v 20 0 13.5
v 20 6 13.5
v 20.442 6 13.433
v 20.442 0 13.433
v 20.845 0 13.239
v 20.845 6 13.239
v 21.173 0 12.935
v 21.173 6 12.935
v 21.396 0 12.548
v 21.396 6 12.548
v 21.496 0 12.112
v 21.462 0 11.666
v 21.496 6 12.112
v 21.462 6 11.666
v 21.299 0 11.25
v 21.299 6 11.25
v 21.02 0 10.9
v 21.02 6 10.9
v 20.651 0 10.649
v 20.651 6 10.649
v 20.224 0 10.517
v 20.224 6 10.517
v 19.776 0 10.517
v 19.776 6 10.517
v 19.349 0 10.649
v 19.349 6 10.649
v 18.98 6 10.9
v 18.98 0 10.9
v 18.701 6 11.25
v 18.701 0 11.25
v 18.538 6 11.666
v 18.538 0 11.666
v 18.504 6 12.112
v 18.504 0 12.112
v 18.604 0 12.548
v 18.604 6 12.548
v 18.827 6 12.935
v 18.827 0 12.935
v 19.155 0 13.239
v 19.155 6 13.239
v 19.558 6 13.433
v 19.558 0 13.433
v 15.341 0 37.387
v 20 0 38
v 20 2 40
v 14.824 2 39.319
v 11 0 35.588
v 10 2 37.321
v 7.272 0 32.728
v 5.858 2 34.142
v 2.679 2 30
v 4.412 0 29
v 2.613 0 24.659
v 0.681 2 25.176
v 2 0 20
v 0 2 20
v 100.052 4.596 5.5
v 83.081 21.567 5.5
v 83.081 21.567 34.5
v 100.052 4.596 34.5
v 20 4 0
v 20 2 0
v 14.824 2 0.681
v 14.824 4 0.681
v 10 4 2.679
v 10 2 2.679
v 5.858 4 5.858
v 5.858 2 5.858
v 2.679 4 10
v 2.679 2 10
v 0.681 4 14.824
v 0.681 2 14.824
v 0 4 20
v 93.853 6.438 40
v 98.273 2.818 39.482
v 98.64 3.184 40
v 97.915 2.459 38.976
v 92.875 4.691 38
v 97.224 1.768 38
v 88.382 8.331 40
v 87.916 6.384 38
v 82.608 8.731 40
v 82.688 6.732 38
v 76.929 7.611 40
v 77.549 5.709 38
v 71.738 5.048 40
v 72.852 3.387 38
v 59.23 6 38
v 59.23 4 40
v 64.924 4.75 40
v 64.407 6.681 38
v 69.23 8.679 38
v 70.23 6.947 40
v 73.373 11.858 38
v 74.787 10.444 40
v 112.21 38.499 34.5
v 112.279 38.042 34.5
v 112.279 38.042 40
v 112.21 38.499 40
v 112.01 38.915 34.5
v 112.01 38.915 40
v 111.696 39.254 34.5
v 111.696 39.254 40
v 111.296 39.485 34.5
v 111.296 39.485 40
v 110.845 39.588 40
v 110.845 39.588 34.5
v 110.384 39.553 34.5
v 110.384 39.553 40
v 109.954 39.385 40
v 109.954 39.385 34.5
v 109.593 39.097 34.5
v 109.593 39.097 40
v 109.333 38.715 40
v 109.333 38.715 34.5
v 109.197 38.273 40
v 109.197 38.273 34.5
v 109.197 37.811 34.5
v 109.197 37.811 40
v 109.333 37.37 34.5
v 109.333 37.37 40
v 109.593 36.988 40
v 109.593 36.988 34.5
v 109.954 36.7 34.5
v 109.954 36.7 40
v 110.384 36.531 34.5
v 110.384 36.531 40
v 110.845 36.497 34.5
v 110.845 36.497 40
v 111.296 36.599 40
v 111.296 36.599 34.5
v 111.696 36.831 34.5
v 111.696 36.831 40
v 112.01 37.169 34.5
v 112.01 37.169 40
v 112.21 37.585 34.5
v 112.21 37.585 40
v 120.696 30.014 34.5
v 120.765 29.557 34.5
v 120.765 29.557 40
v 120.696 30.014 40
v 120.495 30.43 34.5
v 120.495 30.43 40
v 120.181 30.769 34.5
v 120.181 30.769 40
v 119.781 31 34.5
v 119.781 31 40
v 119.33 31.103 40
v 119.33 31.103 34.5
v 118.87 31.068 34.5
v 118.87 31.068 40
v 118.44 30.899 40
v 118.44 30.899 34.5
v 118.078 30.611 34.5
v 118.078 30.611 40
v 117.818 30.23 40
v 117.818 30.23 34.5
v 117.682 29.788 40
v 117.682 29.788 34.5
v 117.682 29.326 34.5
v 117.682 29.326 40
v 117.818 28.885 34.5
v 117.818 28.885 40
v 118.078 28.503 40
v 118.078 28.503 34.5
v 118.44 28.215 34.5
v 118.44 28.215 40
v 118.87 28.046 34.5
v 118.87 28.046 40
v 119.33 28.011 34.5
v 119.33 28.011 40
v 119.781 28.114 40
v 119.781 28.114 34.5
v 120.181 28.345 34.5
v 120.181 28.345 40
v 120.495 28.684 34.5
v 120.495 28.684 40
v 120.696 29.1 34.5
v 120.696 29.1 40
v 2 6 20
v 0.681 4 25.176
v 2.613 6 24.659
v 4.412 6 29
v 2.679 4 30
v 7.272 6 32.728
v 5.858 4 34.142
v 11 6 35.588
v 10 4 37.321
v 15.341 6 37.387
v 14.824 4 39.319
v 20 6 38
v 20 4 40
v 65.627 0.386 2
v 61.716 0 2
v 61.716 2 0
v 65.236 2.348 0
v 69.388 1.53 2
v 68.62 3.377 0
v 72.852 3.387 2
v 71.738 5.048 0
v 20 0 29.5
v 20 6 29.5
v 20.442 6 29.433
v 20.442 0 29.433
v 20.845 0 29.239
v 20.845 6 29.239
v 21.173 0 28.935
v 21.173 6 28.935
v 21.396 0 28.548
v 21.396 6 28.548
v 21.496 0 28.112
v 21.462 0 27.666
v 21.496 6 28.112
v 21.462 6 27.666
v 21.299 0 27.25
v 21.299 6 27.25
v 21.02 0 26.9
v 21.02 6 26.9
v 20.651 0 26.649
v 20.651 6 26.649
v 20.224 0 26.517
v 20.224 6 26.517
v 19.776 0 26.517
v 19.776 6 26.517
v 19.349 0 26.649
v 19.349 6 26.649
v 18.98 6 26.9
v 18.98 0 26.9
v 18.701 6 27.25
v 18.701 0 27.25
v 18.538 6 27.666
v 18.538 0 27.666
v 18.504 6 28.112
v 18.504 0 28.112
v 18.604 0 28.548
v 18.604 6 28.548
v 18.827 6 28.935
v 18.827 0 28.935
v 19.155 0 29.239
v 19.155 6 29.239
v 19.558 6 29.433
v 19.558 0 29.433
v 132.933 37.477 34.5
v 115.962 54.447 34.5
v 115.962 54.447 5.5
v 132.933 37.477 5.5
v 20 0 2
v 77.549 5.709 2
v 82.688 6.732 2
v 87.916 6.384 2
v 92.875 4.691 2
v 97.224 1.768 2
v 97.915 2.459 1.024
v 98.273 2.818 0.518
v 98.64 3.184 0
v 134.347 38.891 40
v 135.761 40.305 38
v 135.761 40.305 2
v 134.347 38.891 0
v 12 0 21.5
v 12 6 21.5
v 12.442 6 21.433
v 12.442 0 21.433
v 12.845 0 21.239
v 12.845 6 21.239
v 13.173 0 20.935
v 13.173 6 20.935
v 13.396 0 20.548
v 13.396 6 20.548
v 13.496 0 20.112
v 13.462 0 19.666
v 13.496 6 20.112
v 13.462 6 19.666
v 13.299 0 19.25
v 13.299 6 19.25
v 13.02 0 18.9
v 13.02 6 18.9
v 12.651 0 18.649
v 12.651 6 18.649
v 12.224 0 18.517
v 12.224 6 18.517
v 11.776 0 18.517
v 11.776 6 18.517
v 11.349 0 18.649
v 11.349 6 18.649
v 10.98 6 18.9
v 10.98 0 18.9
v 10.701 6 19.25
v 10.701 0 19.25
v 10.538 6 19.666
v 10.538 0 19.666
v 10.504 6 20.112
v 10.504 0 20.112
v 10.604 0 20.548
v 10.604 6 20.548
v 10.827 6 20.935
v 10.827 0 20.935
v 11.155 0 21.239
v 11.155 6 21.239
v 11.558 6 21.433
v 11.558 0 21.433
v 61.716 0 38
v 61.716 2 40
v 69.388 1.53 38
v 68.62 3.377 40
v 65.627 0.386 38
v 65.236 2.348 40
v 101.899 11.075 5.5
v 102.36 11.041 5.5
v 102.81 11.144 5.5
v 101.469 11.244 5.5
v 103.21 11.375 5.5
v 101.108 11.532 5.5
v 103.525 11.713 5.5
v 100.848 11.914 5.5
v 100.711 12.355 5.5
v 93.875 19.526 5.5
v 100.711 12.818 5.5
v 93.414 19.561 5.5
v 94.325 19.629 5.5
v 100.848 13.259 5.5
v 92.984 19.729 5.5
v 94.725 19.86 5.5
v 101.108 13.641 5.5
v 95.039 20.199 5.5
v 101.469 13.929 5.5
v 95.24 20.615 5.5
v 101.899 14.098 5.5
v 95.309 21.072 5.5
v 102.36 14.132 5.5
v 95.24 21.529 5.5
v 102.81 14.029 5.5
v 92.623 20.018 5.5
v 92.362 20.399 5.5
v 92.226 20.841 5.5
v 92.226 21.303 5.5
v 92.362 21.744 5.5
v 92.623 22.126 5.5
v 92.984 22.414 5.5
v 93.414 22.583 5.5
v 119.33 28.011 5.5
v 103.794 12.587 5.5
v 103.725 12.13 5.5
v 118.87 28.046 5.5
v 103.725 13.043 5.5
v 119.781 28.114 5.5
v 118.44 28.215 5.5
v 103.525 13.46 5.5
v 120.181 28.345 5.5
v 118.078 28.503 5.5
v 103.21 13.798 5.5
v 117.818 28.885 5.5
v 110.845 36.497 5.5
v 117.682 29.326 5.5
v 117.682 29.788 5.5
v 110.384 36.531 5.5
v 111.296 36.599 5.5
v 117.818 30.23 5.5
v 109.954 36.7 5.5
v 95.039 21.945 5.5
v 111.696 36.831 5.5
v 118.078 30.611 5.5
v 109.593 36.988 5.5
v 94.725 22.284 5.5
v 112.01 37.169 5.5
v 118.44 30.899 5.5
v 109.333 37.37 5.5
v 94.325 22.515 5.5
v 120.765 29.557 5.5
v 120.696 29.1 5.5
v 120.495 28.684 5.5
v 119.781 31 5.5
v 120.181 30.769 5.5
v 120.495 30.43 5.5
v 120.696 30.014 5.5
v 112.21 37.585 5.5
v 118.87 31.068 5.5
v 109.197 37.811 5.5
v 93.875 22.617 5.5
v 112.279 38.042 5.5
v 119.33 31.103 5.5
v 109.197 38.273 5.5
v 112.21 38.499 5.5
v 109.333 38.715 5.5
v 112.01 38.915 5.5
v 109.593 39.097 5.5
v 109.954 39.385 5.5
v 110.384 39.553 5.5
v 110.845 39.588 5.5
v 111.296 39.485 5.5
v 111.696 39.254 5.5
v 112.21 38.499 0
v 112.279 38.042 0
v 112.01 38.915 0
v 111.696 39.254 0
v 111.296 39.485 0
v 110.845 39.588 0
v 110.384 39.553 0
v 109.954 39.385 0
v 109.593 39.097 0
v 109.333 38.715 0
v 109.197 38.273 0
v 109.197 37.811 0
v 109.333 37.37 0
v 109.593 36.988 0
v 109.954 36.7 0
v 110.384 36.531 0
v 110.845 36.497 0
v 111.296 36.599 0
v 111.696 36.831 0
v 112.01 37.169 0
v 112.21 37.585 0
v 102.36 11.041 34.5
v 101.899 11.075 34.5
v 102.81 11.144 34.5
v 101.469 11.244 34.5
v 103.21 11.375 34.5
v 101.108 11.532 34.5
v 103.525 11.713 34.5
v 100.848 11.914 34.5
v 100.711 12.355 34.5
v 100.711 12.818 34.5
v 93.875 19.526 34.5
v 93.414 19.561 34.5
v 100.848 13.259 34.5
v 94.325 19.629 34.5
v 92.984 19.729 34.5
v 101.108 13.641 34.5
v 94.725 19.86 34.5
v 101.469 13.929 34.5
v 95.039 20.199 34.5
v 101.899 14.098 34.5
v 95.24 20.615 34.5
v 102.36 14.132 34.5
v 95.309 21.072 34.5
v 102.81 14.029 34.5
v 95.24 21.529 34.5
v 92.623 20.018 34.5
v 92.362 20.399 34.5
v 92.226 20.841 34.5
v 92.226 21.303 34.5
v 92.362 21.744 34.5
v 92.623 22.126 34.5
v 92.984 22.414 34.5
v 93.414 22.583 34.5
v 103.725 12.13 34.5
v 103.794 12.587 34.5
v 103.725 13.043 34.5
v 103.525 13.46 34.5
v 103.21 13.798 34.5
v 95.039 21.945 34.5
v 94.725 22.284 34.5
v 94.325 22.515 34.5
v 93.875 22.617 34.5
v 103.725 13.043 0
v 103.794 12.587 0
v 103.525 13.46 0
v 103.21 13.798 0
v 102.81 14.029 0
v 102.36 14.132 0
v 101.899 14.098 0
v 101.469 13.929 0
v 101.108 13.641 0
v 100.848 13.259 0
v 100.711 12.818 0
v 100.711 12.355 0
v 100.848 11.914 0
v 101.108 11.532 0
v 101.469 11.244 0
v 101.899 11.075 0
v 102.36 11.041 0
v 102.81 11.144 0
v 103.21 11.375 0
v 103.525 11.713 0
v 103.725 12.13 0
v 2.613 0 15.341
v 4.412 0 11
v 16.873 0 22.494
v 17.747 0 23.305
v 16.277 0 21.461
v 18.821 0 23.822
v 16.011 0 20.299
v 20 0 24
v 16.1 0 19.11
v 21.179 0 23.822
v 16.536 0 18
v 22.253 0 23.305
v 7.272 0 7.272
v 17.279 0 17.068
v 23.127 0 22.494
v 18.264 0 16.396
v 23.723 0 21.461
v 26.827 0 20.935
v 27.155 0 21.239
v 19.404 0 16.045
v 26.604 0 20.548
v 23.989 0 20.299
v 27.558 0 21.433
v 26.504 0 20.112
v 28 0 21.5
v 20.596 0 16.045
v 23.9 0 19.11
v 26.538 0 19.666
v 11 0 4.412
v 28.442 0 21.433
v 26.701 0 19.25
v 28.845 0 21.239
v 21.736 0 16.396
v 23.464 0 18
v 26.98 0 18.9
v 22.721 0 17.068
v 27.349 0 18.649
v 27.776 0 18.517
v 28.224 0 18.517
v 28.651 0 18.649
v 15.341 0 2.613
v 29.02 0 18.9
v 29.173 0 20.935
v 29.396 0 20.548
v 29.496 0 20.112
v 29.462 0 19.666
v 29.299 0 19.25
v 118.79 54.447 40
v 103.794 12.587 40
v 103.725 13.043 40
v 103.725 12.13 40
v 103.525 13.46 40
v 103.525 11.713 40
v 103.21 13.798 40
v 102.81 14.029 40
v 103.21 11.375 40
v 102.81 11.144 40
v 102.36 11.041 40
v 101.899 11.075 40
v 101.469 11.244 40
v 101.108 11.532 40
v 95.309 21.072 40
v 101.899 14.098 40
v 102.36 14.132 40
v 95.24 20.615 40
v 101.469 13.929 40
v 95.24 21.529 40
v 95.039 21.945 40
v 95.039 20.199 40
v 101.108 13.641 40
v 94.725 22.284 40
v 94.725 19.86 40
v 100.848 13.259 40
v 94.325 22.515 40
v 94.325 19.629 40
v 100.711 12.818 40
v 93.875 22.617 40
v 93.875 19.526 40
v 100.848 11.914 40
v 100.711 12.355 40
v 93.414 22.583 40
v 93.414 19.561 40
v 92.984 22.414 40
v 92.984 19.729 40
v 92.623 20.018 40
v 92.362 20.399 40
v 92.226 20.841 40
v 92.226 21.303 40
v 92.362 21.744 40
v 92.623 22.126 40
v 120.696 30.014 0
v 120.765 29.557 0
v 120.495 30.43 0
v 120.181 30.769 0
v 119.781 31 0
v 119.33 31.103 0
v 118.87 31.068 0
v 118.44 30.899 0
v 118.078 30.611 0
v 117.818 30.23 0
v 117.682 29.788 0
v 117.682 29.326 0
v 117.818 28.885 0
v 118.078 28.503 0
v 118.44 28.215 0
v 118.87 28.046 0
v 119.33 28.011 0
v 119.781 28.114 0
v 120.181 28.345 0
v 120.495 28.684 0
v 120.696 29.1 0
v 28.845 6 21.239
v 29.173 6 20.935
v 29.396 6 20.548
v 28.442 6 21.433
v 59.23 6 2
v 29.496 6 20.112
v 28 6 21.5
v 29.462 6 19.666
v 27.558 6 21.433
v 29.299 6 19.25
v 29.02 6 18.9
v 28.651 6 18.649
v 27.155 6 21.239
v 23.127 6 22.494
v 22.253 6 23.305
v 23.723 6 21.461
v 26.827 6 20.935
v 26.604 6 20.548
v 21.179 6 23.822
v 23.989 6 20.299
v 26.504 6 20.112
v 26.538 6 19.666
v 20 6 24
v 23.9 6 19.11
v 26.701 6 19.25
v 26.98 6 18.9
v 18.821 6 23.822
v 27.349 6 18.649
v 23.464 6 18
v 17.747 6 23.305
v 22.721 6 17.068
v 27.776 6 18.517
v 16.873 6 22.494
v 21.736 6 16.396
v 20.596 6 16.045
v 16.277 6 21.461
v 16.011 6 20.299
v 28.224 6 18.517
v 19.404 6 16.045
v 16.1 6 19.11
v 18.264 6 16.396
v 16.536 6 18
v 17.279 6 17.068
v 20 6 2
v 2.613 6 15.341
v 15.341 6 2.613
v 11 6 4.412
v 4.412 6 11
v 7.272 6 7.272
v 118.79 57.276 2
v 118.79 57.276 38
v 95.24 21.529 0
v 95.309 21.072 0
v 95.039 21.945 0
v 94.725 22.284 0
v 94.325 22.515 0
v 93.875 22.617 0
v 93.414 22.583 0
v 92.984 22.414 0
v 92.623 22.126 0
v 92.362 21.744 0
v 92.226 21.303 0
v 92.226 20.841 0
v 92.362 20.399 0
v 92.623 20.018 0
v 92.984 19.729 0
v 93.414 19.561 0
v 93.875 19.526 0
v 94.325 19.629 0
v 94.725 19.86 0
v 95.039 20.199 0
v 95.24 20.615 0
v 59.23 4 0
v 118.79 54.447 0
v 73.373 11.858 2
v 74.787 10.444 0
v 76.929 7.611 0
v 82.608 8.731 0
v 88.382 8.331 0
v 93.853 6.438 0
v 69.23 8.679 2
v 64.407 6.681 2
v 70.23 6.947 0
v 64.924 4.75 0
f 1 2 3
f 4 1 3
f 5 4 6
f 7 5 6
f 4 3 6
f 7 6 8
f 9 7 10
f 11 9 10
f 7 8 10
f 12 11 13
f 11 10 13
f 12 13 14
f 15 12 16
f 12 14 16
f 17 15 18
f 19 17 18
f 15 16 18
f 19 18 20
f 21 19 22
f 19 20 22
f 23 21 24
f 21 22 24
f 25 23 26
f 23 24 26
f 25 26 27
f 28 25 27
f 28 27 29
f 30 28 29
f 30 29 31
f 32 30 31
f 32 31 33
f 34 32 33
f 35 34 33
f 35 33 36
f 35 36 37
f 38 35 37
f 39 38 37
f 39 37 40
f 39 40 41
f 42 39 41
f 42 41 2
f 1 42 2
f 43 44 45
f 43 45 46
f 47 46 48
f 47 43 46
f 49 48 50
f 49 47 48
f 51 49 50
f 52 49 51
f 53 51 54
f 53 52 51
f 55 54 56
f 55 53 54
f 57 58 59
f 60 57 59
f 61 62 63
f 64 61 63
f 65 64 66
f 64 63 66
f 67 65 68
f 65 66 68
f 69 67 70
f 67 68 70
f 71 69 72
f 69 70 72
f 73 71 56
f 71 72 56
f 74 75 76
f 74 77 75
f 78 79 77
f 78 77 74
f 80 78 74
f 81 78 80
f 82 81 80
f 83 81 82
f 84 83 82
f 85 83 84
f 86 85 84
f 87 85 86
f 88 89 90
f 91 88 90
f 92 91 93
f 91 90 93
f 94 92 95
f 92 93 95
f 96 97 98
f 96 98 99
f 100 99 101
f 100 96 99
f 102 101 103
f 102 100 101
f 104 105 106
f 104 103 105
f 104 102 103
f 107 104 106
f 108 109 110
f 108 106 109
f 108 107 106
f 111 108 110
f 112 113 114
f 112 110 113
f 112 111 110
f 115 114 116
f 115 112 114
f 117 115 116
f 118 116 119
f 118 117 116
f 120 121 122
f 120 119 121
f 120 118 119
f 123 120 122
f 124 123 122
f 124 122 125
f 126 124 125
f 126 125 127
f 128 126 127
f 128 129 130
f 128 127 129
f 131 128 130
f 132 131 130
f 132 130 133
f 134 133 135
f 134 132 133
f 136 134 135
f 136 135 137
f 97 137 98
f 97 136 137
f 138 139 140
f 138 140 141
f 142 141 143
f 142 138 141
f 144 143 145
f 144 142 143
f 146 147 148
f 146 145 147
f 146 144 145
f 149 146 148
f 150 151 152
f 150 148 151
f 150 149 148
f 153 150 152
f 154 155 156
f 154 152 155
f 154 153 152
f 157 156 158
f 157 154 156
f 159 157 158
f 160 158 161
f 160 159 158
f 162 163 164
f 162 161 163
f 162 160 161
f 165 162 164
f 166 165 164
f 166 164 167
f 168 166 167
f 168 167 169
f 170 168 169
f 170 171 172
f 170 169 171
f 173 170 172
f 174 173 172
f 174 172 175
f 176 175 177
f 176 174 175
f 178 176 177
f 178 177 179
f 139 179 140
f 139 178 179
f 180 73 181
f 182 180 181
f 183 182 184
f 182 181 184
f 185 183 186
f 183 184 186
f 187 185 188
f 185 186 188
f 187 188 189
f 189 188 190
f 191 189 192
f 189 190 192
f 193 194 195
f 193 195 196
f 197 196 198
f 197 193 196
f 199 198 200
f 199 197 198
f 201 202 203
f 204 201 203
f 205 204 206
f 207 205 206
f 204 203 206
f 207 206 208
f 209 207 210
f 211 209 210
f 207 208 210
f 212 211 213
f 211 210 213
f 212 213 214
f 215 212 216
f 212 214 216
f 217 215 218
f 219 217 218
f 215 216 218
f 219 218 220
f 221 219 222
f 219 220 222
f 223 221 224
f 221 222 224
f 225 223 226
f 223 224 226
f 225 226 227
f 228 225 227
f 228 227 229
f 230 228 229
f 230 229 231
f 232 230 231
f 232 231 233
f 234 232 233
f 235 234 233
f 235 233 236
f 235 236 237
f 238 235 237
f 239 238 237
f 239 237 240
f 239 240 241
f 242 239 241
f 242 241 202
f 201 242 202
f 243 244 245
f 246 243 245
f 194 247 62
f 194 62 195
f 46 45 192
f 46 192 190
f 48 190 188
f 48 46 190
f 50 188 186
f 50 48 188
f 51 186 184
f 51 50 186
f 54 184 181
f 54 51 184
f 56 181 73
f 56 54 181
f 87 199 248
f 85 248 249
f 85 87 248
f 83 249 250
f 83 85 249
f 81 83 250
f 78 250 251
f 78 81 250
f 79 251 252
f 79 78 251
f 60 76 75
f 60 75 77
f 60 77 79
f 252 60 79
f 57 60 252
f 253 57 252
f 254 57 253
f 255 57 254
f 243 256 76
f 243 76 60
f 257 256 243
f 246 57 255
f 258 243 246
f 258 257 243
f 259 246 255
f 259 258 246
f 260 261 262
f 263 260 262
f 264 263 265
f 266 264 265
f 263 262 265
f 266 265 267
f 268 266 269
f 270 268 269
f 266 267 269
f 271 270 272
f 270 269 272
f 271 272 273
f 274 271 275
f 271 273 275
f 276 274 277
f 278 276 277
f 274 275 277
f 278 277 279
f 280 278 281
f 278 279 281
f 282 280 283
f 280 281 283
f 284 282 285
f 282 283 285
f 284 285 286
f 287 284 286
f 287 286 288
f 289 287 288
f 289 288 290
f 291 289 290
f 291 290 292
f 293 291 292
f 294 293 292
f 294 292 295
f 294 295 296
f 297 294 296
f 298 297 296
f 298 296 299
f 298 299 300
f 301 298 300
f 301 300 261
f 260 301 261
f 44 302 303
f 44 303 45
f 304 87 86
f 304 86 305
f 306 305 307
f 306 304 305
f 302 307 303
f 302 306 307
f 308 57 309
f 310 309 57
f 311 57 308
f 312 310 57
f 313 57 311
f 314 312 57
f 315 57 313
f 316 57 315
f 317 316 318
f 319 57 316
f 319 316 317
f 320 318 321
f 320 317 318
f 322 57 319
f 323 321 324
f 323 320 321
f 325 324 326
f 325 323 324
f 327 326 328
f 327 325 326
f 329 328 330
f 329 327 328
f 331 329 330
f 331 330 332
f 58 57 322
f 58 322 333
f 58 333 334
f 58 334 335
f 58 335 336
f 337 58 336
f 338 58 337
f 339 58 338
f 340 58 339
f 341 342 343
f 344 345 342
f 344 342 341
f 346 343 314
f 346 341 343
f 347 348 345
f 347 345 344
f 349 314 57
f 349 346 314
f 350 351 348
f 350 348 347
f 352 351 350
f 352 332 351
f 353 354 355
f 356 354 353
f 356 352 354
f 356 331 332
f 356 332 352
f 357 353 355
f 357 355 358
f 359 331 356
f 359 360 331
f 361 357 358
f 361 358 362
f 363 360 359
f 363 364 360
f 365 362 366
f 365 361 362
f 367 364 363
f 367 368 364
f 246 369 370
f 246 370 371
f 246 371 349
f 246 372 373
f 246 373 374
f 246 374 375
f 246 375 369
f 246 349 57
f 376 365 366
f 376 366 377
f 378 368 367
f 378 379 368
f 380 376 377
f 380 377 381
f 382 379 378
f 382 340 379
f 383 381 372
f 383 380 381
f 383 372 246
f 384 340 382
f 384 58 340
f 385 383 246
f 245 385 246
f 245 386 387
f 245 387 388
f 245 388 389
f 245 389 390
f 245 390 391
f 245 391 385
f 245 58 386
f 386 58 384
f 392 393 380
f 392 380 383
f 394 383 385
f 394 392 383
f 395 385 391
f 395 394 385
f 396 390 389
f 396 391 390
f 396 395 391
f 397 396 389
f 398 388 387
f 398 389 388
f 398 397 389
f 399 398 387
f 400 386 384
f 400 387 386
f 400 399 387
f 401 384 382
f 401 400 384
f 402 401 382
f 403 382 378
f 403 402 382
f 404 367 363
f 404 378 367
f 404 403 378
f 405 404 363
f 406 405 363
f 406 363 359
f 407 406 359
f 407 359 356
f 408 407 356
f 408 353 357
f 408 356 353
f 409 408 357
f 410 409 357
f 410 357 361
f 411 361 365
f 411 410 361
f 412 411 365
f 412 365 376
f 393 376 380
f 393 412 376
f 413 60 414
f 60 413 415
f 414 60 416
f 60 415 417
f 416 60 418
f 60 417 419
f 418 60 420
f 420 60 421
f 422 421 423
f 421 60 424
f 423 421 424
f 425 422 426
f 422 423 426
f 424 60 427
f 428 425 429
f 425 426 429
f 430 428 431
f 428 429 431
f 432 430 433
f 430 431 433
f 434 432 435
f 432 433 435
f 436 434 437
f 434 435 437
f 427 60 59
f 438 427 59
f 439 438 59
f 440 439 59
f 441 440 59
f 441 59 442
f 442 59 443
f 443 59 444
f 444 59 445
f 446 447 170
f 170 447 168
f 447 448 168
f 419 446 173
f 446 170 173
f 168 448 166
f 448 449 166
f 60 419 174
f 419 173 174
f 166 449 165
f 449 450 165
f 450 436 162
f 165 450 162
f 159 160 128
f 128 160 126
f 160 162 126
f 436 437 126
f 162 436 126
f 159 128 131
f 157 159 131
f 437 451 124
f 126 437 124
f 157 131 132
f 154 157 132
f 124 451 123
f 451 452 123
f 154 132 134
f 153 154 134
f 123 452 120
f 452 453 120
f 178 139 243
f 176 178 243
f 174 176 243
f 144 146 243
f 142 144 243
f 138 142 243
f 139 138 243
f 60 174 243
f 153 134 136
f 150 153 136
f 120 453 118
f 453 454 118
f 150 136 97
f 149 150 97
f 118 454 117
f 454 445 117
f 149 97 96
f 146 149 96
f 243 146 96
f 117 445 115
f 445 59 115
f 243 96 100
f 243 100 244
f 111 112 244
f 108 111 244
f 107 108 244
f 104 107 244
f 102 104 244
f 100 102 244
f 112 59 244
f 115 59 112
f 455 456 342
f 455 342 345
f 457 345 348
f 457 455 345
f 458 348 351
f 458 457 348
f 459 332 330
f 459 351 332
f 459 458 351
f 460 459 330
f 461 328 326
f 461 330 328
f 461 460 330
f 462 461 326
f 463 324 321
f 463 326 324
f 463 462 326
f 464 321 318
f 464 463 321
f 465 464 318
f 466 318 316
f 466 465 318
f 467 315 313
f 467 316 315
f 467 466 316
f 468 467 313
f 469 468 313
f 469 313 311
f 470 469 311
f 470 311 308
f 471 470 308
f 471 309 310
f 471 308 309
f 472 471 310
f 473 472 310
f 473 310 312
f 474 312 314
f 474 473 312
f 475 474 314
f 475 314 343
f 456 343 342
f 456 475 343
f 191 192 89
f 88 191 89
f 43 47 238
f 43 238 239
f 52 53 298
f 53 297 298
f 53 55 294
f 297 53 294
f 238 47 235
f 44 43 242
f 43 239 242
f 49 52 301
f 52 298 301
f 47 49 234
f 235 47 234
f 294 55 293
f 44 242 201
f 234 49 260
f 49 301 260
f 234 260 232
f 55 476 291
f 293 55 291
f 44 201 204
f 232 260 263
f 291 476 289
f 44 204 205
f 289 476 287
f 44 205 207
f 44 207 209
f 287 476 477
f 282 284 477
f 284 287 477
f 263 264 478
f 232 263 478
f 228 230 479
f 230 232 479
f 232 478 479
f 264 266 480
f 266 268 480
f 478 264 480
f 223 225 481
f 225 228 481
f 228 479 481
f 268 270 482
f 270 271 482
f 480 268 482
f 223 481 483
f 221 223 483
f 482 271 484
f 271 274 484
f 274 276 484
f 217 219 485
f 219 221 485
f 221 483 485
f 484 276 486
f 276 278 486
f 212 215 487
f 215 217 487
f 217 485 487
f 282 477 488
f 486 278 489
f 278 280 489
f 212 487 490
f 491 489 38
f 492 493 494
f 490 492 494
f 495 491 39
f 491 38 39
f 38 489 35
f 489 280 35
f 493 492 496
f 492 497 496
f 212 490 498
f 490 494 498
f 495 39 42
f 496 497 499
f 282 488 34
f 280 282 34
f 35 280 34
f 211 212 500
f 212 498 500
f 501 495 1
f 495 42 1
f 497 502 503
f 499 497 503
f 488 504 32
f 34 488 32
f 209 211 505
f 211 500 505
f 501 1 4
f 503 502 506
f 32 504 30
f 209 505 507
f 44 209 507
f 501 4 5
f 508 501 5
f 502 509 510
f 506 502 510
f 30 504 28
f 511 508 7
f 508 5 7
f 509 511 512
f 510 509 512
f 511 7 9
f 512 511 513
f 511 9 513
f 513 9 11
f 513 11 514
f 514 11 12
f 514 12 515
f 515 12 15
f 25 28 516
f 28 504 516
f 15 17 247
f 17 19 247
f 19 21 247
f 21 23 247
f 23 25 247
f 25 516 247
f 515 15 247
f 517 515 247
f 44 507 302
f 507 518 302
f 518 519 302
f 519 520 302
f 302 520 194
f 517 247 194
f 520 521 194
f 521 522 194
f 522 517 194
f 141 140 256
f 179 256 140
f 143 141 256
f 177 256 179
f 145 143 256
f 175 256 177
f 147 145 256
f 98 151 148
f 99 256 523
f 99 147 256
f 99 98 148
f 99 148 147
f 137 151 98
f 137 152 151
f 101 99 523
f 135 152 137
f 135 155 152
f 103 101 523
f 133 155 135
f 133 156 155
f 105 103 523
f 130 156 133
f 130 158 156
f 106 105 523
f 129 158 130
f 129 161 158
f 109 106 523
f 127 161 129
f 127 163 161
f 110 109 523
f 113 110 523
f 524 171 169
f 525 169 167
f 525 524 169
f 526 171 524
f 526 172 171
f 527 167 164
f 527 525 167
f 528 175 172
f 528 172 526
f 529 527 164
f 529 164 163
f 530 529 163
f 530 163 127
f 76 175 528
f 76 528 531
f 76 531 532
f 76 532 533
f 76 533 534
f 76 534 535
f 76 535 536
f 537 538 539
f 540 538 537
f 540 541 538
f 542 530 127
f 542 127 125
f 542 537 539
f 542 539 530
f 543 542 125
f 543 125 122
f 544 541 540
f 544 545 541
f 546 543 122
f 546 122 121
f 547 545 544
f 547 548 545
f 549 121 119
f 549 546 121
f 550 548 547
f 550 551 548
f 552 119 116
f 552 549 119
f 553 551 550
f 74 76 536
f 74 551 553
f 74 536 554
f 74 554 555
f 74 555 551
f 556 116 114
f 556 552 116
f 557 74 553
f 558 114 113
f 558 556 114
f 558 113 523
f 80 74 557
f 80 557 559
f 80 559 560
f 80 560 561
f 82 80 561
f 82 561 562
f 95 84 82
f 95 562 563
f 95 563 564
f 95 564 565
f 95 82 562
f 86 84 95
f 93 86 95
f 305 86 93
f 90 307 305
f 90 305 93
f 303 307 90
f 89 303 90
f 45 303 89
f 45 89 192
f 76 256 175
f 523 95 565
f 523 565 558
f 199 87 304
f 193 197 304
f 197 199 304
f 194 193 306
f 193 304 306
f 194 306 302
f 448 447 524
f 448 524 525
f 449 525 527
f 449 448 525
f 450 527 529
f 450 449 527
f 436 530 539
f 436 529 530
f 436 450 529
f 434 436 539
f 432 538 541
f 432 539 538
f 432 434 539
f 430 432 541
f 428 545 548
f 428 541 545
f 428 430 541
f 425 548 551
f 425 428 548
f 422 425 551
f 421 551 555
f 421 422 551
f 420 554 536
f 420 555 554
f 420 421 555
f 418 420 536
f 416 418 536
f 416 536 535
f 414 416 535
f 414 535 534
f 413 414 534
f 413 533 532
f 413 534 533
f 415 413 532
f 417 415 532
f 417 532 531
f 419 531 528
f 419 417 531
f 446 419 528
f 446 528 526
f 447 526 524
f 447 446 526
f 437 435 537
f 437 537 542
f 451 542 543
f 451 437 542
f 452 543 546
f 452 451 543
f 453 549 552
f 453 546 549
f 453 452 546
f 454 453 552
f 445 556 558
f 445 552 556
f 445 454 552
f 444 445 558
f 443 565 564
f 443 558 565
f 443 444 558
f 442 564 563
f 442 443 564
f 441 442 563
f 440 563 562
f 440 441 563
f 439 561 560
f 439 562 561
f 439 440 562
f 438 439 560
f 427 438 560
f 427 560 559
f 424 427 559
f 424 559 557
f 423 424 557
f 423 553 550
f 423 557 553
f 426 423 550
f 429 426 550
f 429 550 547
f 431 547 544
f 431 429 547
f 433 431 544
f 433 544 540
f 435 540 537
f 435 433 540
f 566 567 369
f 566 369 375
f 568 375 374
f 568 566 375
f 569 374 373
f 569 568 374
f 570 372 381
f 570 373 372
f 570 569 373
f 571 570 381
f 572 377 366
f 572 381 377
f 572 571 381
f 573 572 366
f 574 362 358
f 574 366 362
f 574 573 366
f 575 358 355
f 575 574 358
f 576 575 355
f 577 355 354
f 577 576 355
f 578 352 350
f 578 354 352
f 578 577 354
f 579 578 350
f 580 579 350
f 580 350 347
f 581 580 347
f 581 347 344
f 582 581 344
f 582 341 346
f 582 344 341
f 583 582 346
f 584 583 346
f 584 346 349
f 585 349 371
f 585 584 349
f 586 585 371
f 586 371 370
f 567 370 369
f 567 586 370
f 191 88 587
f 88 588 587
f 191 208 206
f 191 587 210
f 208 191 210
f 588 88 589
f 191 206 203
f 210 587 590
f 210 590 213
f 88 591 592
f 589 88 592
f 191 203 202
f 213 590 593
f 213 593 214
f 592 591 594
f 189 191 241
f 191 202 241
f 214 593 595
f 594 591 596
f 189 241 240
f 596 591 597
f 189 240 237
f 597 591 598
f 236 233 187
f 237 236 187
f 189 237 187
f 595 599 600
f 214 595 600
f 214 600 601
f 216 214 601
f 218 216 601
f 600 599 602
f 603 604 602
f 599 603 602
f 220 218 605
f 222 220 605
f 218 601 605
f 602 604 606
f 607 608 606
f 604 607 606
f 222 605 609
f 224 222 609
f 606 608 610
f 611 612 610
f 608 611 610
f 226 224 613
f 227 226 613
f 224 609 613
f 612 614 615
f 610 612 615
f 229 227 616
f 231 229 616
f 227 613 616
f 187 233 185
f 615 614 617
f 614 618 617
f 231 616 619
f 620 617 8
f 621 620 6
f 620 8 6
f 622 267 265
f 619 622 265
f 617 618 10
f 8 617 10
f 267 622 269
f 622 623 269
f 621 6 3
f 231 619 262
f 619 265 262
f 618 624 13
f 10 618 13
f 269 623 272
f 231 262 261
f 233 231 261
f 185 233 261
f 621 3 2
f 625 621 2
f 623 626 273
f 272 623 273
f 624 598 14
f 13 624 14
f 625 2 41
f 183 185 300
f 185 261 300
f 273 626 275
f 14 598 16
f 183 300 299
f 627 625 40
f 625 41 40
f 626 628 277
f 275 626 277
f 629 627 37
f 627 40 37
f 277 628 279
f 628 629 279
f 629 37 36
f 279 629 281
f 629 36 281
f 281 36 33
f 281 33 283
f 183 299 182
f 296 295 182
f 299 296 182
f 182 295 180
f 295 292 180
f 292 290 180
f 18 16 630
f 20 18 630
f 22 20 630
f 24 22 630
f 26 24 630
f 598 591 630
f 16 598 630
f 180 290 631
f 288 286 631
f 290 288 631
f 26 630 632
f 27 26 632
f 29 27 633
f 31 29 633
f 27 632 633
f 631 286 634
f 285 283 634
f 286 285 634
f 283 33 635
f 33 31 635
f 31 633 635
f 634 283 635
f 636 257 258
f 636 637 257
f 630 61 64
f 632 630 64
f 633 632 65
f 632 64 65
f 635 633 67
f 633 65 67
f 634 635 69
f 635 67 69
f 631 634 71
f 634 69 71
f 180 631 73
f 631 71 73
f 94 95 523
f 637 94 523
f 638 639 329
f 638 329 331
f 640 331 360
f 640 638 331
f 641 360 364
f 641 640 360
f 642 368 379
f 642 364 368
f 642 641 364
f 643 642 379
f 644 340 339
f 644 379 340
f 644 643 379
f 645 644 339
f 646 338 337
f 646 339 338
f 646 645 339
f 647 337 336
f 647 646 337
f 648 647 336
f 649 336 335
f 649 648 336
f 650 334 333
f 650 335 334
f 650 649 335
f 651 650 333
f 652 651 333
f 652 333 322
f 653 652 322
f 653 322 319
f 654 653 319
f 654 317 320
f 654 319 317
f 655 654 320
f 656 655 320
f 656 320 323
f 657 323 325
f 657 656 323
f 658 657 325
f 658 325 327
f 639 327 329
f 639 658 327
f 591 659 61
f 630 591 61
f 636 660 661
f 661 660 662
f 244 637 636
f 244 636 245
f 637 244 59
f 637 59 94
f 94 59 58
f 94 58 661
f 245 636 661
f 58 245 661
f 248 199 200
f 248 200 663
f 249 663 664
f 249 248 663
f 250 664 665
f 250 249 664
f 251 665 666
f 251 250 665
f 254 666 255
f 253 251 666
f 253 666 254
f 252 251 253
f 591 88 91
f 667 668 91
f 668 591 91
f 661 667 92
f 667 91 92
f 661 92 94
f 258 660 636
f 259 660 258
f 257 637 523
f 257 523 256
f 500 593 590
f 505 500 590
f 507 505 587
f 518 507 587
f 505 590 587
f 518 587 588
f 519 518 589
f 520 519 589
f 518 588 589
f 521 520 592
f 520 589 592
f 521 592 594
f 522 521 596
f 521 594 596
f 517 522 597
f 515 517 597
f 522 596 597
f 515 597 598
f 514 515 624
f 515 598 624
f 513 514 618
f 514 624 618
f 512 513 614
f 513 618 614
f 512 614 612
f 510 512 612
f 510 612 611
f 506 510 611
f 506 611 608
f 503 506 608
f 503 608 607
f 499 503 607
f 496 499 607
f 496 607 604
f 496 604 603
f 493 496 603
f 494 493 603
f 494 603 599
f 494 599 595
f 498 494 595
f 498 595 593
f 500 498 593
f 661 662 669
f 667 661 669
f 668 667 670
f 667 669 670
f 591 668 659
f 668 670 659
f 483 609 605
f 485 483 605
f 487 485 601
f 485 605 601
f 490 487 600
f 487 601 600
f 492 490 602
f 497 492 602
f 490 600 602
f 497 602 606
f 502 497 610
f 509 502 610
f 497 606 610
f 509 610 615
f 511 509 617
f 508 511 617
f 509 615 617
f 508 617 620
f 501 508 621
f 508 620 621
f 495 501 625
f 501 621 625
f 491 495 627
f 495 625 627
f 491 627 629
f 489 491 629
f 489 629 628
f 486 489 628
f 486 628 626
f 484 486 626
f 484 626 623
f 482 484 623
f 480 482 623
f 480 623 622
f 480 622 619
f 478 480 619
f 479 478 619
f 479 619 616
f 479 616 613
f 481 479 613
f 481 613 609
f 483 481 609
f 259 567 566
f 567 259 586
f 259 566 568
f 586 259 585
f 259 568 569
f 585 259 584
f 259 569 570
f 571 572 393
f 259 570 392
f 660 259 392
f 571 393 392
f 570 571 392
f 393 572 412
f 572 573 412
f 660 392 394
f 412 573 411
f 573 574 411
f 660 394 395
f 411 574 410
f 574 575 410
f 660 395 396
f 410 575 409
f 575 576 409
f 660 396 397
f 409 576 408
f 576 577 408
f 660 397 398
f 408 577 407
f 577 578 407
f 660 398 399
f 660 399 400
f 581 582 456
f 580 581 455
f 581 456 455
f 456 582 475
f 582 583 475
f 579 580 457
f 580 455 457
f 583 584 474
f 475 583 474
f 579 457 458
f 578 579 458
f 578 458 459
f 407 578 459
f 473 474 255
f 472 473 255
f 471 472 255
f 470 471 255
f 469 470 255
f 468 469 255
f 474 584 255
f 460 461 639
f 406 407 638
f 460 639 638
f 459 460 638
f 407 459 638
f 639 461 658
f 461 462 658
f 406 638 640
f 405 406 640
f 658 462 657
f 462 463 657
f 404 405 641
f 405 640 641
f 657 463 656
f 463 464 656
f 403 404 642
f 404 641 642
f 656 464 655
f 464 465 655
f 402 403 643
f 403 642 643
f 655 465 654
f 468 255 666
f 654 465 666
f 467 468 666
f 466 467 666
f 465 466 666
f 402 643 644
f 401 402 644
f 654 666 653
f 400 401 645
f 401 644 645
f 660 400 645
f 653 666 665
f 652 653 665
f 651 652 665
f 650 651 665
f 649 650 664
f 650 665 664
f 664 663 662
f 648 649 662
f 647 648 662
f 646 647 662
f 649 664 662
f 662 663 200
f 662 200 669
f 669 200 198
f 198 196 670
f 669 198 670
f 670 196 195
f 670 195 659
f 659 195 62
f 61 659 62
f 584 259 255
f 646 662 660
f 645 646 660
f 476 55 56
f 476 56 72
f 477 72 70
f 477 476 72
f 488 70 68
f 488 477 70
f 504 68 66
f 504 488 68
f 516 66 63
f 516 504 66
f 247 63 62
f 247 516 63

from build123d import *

# Parameters (mm, degrees)
BOSS_EXTRUDE1_DEPTH     = 40
SKETCH2_W               = 40
SKETCH2_H               = 54.5
SKETCH2_W_2             = 1.5
SKETCH2_H_2             = 46.5
BOSS_EXTRUDE2_DEPTH     = 18
SKETCH3_W               = 29
SKETCH3_H               = 46.5
CUT_EXTRUDE1_DEPTH      = 30
SKETCH4_R               = 4
SKETCH4_R_2             = 1.5
CUT_EXTRUDE2_DEPTH      = 30
CUT_EXTRUDE3_DEPTH      = 153.681139277
CUT_EXTRUDE3_DEPTH_BACK = 153.681139277
SKETCH8_R               = 1.55
SKETCH8_R_2             = 1.05
FILLET1_R               = 20
FILLET2_R               = 20
FILLET3_R               = 20
CHAMFER1_SIZE           = 2


# Some blends are built 0.0001 mm under size
with BuildPart() as part:
    # Sketch1 → Boss-Extrude1 (new body)
    with BuildSketch(Plane.XY):
        Polygon((118.790367902, 57.275649276), (67.514718626, 6), (0, 6), (0, 0), (70, 0), (123.033008589, 53.033008589), align=None)
    extrude(amount=BOSS_EXTRUDE1_DEPTH)

    # Sketch2 → Boss-Extrude2 (add)
    # profile 1 of 3: a face of its own
    with BuildSketch(Plane(origin=(35, -35, 0), x_dir=(0, 0, -1), z_dir=(0.7071067811865521, -0.707106781186543, 0))):
        with Locations((-20, 97.247474683)):
            Rectangle(SKETCH2_W, SKETCH2_H)
        Polygon((-36, 73.997474683), (-36, 120.497474683), (-34.5, 120.497474683), (-5.5, 120.497474683), (-4, 120.497474683), (-4, 73.997474683), (-5.5, 73.997474683), (-34.5, 73.997474683), align=None, mode=Mode.SUBTRACT)
    # profile 2 of 3: a face of its own
    with BuildSketch(Plane(origin=(35, -35, 0), x_dir=(0, 0, -1), z_dir=(0.7071067811865521, -0.707106781186543, 0))):
        with Locations((-35.25, 97.247474683)):
            Rectangle(SKETCH2_W_2, SKETCH2_H_2)
    # profile 3 of 3: a face of its own
    with BuildSketch(Plane(origin=(35, -35, 0), x_dir=(0, 0, -1), z_dir=(0.7071067811865521, -0.707106781186543, 0))):
        with Locations((-4.75, 97.247474683)):
            Rectangle(SKETCH2_W_2, SKETCH2_H_2)
    extrude(amount=BOSS_EXTRUDE2_DEPTH)

    # Sketch3 → Cut-Extrude1 (cut)
    with BuildSketch(Plane(origin=(35, -35, 0), x_dir=(0, 0, -1), z_dir=(0.7071067811865521, -0.707106781186543, 0))):
        with Locations((-20, 97.247474683)):
            Rectangle(SKETCH3_W, SKETCH3_H)
    extrude(amount=-CUT_EXTRUDE1_DEPTH, mode=Mode.SUBTRACT)

    # Sketch4 → Cut-Extrude2 (cut)
    with BuildSketch(Plane(origin=(0, 6, 0), x_dir=(1, 0, 0), z_dir=(0, 1, 0))):
        with Locations(Location((20, -20, 0), (0, 0, 270))):
            Circle(SKETCH4_R)
        with Locations(Location((20, -12, 0), (0, 0, 270))):
            Circle(SKETCH4_R_2)
        with Locations(Location((28, -20, 0), (0, 0, 270))):
            Circle(SKETCH4_R_2)
        with Locations(Location((20, -28, 0), (0, 0, 270))):
            Circle(SKETCH4_R_2)
        with Locations(Location((12, -20, 0), (0, 0, 270))):
            Circle(SKETCH4_R_2)
    extrude(amount=-CUT_EXTRUDE2_DEPTH, mode=Mode.SUBTRACT)

    # Sketch8 → Cut-Extrude3 (cut, two sides: drawn at the far end of the back side and taken through both)
    # profile 1 of 8: a face of its own
    with BuildSketch(Plane.XY.offset(40).offset(-CUT_EXTRUDE3_DEPTH_BACK)):
        with Locations((93.758787848, 21.071782079)):
            Circle(SKETCH8_R)
        with Locations((93.758787848, 21.071782079)):
            Circle(SKETCH8_R_2, mode=Mode.SUBTRACT)
    # profile 2 of 8: a face of its own
    with BuildSketch(Plane.XY.offset(40).offset(-CUT_EXTRUDE3_DEPTH_BACK)):
        with Locations((93.758787848, 21.071782079)):
            Circle(SKETCH8_R_2)
    # profile 3 of 8: a face of its own
    with BuildSketch(Plane.XY.offset(40).offset(-CUT_EXTRUDE3_DEPTH_BACK)):
        with Locations((102.244069222, 12.586500705)):
            Circle(SKETCH8_R)
        with Locations((102.244069222, 12.586500705)):
            Circle(SKETCH8_R_2, mode=Mode.SUBTRACT)
    # profile 4 of 8: a face of its own
    with BuildSketch(Plane.XY.offset(40).offset(-CUT_EXTRUDE3_DEPTH_BACK)):
        with Locations((102.244069222, 12.586500705)):
            Circle(SKETCH8_R_2)
    # profile 5 of 8: a face of its own
    with BuildSketch(Plane.XY.offset(40).offset(-CUT_EXTRUDE3_DEPTH_BACK)):
        with Locations((110.729350596, 38.042344828)):
            Circle(SKETCH8_R)
        with Locations((110.729350596, 38.042344828)):
            Circle(SKETCH8_R_2, mode=Mode.SUBTRACT)
    # profile 6 of 8: a face of its own
    with BuildSketch(Plane.XY.offset(40).offset(-CUT_EXTRUDE3_DEPTH_BACK)):
        with Locations((110.729350596, 38.042344828)):
            Circle(SKETCH8_R_2)
    # profile 7 of 8: a face of its own
    with BuildSketch(Plane.XY.offset(40).offset(-CUT_EXTRUDE3_DEPTH_BACK)):
        with Locations((119.214631971, 29.557063454)):
            Circle(SKETCH8_R)
        with Locations((119.214631971, 29.557063454)):
            Circle(SKETCH8_R_2, mode=Mode.SUBTRACT)
    # profile 8 of 8: a face of its own
    with BuildSketch(Plane.XY.offset(40).offset(-CUT_EXTRUDE3_DEPTH_BACK)):
        with Locations((119.214631971, 29.557063454)):
            Circle(SKETCH8_R_2)
    extrude(amount=CUT_EXTRUDE3_DEPTH + CUT_EXTRUDE3_DEPTH_BACK, mode=Mode.SUBTRACT)

    # Fillet1
    fillet1_edges = [part.edges().sort_by_distance(p)[0] for p in [
        (67.514718626, 6, 20),
        (70, 0, 20),
    ]]
    fillet(fillet1_edges, radius=FILLET1_R)

    # Fillet2
    # the kernel refuses this fillet: 20 mm, written as the material it adds along each edge
    with BuildSketch(Plane(origin=(84.495689014, 14.495689014, 40), x_dir=(0.7071067811865529, -0.7071067811865424, 0), z_dir=(0, 0, -1))) as fillet2_piece_1:
        with BuildLine():
            CenterArc((19.242903422, 19.961342417), FILLET2_R, 191.165307073, 75.271741026)
            Line((-0.378548289, 16.088535585), (-2.34069346, 15.701254901))
            ThreePointArc((-2.34069346, 15.701254901), (-2, 12.215728753), (-2, 0))
            Line((-2, 0), (0, -2))
            ThreePointArc((0, -2), (9, -2), (17.875709658, -1.996134242))
            Line((17.875709658, -1.996134242), (18, 0))
        make_face()
    extrude(amount=40)

    # Fillet3
    fillet3_edges = [part.edges().sort_by_distance(p)[0] for p in [
        (0, 3, 0),
        (0, 3, 40),
    ]]
    fillet(fillet3_edges, radius=FILLET3_R - 0.0001)  # a hair under: the kernel refuses the full size

    # Chamfer1
    chamfer1_edges = [part.edges().sort_by_distance(p)[0] for p in [
        (96.081475452, 34.566756826, 0),
        (96.081475452, 34.566756826, 40),
        (67.53556592, 0.865489414, 40),
        (66.884116026, 7.52240935, 0),
        (66.884116026, 7.52240935, 40),
        (67.53556592, 0.865489414, 0),
        (85.313564088, 6.73010305, 0),
        (127.275649276, 48.790367902, 40),
        (85.313564088, 6.73010305, 40),
        (40.857814376, 0, 0),
        (39.615173689, 6, 0),
        (39.615173689, 6, 40),
        (5.857835087, 6, 34.142164913),
        (5.857835087, 6, 5.857835087),
        (40.857814376, 0, 40),
        (5.857835087, 0, 34.142164913),
        (5.857835087, 0, 5.857835087),
        (127.275649276, 48.790367902, 0),
    ]]
    chamfer(chamfer1_edges, length=CHAMFER1_SIZE)


solid = part.part
